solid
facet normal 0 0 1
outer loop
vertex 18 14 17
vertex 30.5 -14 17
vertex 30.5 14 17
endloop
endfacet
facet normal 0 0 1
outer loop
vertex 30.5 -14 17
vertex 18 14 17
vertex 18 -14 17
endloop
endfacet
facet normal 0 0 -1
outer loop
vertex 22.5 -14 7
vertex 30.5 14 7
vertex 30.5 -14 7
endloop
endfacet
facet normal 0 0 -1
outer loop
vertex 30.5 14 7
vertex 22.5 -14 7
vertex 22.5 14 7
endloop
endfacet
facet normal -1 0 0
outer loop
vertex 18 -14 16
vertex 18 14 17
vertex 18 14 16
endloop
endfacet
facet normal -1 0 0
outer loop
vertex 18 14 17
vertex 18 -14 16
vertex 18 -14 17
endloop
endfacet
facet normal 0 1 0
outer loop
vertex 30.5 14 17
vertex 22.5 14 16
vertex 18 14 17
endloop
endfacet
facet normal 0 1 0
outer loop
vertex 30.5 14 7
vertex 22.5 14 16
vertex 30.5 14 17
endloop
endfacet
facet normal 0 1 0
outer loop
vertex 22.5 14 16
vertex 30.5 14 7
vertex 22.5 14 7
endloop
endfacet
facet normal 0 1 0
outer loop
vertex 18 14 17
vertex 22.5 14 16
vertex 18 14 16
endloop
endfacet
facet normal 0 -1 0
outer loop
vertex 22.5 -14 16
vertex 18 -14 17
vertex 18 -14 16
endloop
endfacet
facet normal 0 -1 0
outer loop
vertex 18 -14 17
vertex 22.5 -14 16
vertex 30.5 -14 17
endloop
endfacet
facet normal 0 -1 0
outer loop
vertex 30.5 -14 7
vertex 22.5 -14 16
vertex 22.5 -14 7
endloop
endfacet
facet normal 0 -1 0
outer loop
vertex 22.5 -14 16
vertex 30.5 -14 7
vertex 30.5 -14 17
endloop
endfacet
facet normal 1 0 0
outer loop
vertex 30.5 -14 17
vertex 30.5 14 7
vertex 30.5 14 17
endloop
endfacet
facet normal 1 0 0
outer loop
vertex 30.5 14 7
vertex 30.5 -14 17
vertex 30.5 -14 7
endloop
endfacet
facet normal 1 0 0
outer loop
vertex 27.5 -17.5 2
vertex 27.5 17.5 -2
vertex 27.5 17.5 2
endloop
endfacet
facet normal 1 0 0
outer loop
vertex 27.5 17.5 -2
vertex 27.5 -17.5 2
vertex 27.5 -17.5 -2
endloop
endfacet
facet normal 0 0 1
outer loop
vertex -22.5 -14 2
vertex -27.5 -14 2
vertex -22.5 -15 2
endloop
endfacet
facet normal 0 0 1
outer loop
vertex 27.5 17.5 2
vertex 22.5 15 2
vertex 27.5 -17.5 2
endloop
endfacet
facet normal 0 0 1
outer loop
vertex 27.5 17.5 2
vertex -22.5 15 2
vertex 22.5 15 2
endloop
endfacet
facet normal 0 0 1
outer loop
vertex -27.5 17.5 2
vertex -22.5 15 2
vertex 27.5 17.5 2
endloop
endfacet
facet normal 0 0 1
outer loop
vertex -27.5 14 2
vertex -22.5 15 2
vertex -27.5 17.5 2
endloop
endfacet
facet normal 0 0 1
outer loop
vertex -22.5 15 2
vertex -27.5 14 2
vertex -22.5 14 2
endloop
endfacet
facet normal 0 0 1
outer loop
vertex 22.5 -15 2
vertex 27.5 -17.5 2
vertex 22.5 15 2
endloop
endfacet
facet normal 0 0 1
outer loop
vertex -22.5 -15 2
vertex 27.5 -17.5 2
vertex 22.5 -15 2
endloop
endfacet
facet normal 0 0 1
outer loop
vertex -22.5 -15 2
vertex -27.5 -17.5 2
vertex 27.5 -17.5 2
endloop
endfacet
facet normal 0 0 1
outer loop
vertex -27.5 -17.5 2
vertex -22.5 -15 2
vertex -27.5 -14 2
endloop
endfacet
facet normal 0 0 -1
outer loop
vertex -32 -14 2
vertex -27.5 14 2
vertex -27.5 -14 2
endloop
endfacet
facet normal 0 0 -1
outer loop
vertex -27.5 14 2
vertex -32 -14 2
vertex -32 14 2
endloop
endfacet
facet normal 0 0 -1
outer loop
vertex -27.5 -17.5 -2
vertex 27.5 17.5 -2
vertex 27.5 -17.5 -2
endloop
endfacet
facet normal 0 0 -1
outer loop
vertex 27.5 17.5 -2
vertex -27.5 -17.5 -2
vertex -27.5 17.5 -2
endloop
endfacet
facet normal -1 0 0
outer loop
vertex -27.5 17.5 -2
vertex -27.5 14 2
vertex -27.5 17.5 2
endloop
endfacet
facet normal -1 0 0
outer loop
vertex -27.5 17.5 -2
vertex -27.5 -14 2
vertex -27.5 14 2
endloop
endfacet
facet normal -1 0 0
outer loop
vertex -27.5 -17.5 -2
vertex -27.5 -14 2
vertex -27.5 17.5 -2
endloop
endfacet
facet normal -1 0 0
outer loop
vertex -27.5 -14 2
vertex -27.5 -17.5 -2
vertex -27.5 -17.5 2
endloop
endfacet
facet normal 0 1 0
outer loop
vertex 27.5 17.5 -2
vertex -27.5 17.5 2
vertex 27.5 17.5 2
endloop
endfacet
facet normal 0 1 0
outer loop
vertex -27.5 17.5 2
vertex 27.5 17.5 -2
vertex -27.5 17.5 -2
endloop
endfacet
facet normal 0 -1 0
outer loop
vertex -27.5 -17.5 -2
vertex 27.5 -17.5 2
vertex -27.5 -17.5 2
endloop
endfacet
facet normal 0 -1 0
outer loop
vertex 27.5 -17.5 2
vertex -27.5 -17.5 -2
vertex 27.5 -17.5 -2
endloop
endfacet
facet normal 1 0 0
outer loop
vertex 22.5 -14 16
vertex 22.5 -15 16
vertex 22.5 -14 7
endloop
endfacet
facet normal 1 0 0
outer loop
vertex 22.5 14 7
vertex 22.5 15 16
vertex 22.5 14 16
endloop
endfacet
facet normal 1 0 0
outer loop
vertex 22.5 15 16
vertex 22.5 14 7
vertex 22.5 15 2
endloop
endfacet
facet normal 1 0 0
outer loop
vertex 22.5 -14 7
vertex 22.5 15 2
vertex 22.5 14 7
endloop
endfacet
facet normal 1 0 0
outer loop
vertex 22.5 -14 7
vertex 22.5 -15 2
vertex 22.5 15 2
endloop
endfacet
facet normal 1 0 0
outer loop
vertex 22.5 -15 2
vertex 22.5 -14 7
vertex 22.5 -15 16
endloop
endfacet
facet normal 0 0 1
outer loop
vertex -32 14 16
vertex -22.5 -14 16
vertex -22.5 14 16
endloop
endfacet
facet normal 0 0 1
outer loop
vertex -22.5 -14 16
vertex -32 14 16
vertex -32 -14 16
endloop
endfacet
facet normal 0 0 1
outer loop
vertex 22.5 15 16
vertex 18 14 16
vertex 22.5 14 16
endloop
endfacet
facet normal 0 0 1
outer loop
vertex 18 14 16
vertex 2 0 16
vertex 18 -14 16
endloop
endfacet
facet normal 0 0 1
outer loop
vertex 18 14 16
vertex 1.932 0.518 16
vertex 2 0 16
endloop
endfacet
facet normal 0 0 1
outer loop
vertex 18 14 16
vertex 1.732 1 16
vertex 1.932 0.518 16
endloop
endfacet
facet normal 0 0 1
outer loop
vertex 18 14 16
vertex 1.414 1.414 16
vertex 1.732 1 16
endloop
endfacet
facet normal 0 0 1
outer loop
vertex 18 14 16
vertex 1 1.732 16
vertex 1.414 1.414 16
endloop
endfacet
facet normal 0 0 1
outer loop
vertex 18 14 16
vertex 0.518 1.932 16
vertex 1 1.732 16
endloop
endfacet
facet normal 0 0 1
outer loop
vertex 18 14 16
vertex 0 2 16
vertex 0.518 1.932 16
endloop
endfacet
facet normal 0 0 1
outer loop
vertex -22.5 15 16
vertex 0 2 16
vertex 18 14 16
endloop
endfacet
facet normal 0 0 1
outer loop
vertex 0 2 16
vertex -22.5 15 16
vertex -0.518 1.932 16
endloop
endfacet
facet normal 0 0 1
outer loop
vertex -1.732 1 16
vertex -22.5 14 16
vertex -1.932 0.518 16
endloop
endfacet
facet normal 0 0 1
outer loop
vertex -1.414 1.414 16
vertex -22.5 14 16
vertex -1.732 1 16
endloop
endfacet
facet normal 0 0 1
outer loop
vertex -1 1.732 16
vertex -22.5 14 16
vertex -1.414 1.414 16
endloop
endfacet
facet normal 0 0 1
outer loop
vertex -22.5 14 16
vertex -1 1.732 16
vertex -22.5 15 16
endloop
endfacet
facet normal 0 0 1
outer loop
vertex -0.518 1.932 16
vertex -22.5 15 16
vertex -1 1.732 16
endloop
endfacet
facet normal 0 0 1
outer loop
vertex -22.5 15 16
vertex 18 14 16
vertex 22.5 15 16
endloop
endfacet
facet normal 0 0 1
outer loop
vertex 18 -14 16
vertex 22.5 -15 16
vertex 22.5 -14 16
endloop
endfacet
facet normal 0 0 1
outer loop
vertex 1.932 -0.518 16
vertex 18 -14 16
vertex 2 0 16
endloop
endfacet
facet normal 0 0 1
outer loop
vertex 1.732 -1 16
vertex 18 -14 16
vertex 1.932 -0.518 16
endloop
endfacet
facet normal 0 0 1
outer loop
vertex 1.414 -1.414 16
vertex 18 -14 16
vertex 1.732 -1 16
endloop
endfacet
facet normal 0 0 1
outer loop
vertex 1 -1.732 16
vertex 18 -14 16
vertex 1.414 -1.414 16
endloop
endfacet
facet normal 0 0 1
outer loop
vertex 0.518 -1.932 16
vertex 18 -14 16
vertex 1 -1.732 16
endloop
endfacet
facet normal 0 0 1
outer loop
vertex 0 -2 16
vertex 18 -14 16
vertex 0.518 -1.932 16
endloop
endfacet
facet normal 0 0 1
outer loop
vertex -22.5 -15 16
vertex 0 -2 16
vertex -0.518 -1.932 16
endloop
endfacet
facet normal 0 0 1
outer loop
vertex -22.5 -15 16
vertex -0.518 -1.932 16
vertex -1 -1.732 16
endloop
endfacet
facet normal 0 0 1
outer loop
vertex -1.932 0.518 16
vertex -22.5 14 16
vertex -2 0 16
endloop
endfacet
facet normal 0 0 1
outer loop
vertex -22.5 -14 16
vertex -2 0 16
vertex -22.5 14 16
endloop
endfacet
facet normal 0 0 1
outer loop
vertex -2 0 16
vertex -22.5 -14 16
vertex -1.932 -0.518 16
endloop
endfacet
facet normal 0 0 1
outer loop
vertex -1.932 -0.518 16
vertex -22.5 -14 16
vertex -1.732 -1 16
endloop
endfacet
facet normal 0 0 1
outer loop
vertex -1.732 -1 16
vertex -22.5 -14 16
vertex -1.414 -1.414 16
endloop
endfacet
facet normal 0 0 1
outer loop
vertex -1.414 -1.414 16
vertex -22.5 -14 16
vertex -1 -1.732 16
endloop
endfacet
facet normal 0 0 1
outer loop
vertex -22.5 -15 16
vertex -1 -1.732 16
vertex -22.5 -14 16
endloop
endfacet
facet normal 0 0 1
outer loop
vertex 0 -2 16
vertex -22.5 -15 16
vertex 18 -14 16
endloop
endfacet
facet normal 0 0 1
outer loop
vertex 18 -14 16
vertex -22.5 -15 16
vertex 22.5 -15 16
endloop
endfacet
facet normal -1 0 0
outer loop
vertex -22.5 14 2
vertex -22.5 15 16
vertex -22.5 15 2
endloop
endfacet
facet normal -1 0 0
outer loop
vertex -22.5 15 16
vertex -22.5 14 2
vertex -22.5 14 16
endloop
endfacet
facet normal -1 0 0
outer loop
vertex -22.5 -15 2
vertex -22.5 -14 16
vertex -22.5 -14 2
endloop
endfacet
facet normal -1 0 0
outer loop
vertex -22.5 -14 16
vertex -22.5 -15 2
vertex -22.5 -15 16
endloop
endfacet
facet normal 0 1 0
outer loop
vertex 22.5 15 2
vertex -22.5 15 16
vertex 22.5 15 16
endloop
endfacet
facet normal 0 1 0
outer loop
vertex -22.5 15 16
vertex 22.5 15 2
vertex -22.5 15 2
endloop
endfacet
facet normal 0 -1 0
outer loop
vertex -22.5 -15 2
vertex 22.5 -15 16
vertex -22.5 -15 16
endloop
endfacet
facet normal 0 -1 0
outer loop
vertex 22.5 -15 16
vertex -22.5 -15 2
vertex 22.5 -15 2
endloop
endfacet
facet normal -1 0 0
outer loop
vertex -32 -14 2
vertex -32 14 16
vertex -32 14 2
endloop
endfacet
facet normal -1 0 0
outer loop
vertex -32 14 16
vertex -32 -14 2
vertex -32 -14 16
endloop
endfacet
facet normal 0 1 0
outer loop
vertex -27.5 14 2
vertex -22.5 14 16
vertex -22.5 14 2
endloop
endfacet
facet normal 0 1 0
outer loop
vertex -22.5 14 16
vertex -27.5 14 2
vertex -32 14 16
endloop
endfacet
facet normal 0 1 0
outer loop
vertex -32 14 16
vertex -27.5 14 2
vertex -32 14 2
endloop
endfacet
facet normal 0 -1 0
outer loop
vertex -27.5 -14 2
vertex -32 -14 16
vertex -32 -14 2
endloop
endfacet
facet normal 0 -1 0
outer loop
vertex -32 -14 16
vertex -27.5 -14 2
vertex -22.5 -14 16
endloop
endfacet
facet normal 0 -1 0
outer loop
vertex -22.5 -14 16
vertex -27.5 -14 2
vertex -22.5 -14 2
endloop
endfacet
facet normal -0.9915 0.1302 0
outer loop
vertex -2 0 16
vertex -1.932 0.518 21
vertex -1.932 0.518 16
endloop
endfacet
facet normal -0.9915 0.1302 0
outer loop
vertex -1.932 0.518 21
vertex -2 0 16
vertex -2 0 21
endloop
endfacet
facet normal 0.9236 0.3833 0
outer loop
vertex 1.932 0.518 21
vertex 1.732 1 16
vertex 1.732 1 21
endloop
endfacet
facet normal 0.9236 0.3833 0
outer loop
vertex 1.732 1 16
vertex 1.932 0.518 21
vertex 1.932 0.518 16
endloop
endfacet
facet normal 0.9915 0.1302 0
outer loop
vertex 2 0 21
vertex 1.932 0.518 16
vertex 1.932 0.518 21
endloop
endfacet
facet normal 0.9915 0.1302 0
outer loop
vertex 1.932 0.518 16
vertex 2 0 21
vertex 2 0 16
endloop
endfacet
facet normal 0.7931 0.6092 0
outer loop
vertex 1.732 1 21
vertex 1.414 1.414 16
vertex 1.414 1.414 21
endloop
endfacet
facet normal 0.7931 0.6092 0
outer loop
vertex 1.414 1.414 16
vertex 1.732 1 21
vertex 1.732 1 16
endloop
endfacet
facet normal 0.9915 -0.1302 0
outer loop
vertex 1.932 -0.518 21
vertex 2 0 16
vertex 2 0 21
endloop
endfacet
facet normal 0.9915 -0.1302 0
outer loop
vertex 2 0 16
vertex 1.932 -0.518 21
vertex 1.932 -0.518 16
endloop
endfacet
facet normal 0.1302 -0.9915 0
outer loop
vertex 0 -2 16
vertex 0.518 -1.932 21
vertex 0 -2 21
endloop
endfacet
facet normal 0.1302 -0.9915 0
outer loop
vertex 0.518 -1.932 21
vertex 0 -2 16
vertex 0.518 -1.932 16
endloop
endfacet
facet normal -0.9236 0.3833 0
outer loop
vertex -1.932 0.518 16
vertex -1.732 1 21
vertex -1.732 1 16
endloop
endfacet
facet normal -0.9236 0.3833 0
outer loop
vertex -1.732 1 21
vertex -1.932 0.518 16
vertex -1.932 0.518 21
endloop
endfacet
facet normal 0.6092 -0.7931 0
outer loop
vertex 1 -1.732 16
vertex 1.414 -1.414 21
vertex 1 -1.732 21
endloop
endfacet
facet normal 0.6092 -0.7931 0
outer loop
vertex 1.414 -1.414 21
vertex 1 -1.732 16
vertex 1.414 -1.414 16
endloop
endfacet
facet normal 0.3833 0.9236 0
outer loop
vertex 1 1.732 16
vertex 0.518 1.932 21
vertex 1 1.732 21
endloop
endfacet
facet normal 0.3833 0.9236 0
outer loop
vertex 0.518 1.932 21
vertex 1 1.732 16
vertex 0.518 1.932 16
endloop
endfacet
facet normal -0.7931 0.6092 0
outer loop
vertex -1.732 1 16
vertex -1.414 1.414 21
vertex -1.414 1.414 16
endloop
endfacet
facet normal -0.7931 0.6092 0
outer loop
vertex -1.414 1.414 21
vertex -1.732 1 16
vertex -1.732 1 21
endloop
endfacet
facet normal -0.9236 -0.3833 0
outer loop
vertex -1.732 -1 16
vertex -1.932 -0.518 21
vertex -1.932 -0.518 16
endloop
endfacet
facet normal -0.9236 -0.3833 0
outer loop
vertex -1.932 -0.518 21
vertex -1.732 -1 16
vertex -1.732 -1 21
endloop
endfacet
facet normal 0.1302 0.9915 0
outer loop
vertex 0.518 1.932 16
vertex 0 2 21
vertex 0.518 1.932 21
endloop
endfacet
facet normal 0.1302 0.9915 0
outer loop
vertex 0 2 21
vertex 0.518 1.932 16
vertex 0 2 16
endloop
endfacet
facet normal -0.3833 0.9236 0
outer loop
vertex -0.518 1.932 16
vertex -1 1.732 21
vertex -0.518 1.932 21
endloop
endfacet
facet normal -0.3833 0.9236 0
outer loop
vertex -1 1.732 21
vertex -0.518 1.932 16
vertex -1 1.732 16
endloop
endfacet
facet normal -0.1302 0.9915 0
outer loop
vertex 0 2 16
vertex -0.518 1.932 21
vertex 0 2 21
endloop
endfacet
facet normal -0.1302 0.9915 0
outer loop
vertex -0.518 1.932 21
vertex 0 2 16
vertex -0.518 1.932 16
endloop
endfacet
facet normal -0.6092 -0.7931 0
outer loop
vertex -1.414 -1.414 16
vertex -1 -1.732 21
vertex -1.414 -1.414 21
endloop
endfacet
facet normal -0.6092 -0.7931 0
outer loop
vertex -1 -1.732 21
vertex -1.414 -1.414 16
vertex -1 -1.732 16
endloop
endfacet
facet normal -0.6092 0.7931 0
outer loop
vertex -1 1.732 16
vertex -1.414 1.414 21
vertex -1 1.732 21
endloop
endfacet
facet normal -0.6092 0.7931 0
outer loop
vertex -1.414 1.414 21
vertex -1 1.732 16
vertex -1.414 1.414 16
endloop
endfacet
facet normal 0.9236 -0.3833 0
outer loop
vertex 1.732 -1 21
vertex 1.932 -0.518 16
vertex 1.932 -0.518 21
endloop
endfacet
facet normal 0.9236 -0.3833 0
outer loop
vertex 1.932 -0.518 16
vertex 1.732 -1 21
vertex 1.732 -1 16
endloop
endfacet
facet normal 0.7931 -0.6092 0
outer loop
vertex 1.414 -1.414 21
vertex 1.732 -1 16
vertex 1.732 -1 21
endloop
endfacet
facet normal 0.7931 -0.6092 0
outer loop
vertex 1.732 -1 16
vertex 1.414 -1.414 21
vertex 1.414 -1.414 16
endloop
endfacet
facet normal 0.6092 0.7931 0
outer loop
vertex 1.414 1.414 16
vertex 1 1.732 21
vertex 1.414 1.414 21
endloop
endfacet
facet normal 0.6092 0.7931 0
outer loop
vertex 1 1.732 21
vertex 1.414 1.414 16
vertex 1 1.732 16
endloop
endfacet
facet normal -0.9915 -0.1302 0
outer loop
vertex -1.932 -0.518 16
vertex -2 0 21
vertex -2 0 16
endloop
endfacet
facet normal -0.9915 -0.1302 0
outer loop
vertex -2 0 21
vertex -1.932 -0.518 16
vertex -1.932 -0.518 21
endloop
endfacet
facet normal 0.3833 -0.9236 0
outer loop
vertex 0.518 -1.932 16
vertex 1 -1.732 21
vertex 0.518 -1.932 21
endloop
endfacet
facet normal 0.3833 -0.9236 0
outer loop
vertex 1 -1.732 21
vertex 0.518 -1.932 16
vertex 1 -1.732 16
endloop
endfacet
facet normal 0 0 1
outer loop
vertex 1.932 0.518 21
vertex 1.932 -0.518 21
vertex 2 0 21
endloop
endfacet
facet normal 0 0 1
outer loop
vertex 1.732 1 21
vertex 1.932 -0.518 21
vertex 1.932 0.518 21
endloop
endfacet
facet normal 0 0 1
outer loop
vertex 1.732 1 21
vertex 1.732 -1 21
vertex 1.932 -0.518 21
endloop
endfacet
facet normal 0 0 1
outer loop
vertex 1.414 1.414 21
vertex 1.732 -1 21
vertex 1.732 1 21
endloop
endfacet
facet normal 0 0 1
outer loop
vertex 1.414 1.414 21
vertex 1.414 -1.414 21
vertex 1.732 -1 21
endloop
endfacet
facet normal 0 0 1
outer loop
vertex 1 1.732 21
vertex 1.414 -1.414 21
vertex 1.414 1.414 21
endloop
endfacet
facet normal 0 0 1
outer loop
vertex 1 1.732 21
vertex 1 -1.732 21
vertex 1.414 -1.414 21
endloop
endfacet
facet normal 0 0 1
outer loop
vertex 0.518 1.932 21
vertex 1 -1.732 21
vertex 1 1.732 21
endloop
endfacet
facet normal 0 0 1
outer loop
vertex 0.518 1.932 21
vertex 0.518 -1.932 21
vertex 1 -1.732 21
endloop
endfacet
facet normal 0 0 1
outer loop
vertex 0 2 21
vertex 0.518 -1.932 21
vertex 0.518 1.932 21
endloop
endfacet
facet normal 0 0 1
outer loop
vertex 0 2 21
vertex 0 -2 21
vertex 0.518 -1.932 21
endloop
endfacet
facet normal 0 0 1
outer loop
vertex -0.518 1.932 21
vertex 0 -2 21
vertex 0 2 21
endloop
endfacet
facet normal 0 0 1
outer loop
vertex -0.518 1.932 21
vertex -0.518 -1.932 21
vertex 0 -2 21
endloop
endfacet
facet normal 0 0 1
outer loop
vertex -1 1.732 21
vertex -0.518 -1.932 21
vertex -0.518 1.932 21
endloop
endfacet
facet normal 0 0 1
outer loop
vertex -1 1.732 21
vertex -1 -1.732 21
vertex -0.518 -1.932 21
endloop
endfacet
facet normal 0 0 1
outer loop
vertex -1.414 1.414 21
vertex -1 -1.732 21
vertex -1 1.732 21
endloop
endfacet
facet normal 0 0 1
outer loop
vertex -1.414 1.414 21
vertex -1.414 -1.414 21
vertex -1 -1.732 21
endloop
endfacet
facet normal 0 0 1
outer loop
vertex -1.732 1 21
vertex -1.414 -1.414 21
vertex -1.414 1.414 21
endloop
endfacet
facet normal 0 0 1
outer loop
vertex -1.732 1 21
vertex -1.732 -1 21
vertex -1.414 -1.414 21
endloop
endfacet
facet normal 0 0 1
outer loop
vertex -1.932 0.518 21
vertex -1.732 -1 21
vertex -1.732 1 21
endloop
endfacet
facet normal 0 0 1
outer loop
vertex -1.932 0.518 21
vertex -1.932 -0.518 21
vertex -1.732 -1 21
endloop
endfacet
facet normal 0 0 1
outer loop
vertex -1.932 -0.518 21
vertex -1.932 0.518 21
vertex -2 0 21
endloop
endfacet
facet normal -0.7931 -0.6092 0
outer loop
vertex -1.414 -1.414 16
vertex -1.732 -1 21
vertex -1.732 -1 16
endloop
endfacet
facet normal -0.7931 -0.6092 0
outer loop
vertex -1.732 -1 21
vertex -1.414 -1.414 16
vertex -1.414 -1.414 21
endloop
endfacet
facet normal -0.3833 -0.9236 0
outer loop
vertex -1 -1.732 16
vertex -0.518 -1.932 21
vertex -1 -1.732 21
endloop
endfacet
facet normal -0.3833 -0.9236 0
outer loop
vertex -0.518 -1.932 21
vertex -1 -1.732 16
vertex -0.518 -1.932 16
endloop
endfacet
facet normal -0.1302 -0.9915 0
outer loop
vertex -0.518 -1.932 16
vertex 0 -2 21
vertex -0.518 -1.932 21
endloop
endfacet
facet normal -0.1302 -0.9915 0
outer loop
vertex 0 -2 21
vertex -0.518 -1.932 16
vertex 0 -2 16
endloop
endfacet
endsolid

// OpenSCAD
$fn = 24;

module tolerance_hole() {
    translate([0, 0, -1])
        cylinder(h = 22, r = 2);
}

module anvil() {
    // Base - wide, flat platform
    cube([55, 35, 4], center = true);
    
    // Main body block
    translate([0, 0, 9])
        cube([45, 30, 14], center = true);
    
    // Horn - tapered wedge approximation using scaled cube
    translate([28, 0, 12]) {
        difference() {
            cube([20, 28, 10], center = true);
            // Taper by removing corner material
            translate([10, 0, 0])
                cube([15, 32, 12], center = true);
        }
    }
    
    // Heel block on opposite side
    translate([-26, 0, 9])
        cube([12, 28, 14], center = true);
    
    // Tolerance hole through main body
    tolerance_hole();
}

module text_emboss() {
    // Simple recessed rectangles to approximate "PYCON"
    // P
    translate([-18, 16, 19.5]) {
        cube([3, 6, 0.8]);
        translate([0, -3, 0]) cube([6, 3, 0.8]);
        translate([0, 0, 0]) cube([6, 2, 0.8]);
    }
    
    // Y
    translate([-8, 16, 19.5]) {
        cube([3, 3, 0.8]);
        translate([3, 0, 0]) cube([3, 3, 0.8]);
        translate([1.5, -3, 0]) cube([3, 3, 0.8]);
    }
    
    // C
    translate([4, 16, 19.5]) {
        cube([6, 2, 0.8]);
        cube([2, 6, 0.8]);
        translate([4, 4, 0]) cube([2, 2, 0.8]);
    }
    
    // O
    translate([16, 16, 19.5]) {
        cube([6, 2, 0.8]);
        cube([2, 6, 0.8]);
        translate([4, 0, 0]) cube([2, 6, 0.8]);
        translate([0, 4, 0]) cube([6, 2, 0.8]);
    }
    
    // N
    translate([26, 16, 19.5]) {
        cube([2, 6, 0.8]);
        translate([4, 0, 0]) cube([2, 6, 0.8]);
        cube([6, 2, 0.8]);
    }
}

difference() {
    anvil();
    text_emboss();
}
